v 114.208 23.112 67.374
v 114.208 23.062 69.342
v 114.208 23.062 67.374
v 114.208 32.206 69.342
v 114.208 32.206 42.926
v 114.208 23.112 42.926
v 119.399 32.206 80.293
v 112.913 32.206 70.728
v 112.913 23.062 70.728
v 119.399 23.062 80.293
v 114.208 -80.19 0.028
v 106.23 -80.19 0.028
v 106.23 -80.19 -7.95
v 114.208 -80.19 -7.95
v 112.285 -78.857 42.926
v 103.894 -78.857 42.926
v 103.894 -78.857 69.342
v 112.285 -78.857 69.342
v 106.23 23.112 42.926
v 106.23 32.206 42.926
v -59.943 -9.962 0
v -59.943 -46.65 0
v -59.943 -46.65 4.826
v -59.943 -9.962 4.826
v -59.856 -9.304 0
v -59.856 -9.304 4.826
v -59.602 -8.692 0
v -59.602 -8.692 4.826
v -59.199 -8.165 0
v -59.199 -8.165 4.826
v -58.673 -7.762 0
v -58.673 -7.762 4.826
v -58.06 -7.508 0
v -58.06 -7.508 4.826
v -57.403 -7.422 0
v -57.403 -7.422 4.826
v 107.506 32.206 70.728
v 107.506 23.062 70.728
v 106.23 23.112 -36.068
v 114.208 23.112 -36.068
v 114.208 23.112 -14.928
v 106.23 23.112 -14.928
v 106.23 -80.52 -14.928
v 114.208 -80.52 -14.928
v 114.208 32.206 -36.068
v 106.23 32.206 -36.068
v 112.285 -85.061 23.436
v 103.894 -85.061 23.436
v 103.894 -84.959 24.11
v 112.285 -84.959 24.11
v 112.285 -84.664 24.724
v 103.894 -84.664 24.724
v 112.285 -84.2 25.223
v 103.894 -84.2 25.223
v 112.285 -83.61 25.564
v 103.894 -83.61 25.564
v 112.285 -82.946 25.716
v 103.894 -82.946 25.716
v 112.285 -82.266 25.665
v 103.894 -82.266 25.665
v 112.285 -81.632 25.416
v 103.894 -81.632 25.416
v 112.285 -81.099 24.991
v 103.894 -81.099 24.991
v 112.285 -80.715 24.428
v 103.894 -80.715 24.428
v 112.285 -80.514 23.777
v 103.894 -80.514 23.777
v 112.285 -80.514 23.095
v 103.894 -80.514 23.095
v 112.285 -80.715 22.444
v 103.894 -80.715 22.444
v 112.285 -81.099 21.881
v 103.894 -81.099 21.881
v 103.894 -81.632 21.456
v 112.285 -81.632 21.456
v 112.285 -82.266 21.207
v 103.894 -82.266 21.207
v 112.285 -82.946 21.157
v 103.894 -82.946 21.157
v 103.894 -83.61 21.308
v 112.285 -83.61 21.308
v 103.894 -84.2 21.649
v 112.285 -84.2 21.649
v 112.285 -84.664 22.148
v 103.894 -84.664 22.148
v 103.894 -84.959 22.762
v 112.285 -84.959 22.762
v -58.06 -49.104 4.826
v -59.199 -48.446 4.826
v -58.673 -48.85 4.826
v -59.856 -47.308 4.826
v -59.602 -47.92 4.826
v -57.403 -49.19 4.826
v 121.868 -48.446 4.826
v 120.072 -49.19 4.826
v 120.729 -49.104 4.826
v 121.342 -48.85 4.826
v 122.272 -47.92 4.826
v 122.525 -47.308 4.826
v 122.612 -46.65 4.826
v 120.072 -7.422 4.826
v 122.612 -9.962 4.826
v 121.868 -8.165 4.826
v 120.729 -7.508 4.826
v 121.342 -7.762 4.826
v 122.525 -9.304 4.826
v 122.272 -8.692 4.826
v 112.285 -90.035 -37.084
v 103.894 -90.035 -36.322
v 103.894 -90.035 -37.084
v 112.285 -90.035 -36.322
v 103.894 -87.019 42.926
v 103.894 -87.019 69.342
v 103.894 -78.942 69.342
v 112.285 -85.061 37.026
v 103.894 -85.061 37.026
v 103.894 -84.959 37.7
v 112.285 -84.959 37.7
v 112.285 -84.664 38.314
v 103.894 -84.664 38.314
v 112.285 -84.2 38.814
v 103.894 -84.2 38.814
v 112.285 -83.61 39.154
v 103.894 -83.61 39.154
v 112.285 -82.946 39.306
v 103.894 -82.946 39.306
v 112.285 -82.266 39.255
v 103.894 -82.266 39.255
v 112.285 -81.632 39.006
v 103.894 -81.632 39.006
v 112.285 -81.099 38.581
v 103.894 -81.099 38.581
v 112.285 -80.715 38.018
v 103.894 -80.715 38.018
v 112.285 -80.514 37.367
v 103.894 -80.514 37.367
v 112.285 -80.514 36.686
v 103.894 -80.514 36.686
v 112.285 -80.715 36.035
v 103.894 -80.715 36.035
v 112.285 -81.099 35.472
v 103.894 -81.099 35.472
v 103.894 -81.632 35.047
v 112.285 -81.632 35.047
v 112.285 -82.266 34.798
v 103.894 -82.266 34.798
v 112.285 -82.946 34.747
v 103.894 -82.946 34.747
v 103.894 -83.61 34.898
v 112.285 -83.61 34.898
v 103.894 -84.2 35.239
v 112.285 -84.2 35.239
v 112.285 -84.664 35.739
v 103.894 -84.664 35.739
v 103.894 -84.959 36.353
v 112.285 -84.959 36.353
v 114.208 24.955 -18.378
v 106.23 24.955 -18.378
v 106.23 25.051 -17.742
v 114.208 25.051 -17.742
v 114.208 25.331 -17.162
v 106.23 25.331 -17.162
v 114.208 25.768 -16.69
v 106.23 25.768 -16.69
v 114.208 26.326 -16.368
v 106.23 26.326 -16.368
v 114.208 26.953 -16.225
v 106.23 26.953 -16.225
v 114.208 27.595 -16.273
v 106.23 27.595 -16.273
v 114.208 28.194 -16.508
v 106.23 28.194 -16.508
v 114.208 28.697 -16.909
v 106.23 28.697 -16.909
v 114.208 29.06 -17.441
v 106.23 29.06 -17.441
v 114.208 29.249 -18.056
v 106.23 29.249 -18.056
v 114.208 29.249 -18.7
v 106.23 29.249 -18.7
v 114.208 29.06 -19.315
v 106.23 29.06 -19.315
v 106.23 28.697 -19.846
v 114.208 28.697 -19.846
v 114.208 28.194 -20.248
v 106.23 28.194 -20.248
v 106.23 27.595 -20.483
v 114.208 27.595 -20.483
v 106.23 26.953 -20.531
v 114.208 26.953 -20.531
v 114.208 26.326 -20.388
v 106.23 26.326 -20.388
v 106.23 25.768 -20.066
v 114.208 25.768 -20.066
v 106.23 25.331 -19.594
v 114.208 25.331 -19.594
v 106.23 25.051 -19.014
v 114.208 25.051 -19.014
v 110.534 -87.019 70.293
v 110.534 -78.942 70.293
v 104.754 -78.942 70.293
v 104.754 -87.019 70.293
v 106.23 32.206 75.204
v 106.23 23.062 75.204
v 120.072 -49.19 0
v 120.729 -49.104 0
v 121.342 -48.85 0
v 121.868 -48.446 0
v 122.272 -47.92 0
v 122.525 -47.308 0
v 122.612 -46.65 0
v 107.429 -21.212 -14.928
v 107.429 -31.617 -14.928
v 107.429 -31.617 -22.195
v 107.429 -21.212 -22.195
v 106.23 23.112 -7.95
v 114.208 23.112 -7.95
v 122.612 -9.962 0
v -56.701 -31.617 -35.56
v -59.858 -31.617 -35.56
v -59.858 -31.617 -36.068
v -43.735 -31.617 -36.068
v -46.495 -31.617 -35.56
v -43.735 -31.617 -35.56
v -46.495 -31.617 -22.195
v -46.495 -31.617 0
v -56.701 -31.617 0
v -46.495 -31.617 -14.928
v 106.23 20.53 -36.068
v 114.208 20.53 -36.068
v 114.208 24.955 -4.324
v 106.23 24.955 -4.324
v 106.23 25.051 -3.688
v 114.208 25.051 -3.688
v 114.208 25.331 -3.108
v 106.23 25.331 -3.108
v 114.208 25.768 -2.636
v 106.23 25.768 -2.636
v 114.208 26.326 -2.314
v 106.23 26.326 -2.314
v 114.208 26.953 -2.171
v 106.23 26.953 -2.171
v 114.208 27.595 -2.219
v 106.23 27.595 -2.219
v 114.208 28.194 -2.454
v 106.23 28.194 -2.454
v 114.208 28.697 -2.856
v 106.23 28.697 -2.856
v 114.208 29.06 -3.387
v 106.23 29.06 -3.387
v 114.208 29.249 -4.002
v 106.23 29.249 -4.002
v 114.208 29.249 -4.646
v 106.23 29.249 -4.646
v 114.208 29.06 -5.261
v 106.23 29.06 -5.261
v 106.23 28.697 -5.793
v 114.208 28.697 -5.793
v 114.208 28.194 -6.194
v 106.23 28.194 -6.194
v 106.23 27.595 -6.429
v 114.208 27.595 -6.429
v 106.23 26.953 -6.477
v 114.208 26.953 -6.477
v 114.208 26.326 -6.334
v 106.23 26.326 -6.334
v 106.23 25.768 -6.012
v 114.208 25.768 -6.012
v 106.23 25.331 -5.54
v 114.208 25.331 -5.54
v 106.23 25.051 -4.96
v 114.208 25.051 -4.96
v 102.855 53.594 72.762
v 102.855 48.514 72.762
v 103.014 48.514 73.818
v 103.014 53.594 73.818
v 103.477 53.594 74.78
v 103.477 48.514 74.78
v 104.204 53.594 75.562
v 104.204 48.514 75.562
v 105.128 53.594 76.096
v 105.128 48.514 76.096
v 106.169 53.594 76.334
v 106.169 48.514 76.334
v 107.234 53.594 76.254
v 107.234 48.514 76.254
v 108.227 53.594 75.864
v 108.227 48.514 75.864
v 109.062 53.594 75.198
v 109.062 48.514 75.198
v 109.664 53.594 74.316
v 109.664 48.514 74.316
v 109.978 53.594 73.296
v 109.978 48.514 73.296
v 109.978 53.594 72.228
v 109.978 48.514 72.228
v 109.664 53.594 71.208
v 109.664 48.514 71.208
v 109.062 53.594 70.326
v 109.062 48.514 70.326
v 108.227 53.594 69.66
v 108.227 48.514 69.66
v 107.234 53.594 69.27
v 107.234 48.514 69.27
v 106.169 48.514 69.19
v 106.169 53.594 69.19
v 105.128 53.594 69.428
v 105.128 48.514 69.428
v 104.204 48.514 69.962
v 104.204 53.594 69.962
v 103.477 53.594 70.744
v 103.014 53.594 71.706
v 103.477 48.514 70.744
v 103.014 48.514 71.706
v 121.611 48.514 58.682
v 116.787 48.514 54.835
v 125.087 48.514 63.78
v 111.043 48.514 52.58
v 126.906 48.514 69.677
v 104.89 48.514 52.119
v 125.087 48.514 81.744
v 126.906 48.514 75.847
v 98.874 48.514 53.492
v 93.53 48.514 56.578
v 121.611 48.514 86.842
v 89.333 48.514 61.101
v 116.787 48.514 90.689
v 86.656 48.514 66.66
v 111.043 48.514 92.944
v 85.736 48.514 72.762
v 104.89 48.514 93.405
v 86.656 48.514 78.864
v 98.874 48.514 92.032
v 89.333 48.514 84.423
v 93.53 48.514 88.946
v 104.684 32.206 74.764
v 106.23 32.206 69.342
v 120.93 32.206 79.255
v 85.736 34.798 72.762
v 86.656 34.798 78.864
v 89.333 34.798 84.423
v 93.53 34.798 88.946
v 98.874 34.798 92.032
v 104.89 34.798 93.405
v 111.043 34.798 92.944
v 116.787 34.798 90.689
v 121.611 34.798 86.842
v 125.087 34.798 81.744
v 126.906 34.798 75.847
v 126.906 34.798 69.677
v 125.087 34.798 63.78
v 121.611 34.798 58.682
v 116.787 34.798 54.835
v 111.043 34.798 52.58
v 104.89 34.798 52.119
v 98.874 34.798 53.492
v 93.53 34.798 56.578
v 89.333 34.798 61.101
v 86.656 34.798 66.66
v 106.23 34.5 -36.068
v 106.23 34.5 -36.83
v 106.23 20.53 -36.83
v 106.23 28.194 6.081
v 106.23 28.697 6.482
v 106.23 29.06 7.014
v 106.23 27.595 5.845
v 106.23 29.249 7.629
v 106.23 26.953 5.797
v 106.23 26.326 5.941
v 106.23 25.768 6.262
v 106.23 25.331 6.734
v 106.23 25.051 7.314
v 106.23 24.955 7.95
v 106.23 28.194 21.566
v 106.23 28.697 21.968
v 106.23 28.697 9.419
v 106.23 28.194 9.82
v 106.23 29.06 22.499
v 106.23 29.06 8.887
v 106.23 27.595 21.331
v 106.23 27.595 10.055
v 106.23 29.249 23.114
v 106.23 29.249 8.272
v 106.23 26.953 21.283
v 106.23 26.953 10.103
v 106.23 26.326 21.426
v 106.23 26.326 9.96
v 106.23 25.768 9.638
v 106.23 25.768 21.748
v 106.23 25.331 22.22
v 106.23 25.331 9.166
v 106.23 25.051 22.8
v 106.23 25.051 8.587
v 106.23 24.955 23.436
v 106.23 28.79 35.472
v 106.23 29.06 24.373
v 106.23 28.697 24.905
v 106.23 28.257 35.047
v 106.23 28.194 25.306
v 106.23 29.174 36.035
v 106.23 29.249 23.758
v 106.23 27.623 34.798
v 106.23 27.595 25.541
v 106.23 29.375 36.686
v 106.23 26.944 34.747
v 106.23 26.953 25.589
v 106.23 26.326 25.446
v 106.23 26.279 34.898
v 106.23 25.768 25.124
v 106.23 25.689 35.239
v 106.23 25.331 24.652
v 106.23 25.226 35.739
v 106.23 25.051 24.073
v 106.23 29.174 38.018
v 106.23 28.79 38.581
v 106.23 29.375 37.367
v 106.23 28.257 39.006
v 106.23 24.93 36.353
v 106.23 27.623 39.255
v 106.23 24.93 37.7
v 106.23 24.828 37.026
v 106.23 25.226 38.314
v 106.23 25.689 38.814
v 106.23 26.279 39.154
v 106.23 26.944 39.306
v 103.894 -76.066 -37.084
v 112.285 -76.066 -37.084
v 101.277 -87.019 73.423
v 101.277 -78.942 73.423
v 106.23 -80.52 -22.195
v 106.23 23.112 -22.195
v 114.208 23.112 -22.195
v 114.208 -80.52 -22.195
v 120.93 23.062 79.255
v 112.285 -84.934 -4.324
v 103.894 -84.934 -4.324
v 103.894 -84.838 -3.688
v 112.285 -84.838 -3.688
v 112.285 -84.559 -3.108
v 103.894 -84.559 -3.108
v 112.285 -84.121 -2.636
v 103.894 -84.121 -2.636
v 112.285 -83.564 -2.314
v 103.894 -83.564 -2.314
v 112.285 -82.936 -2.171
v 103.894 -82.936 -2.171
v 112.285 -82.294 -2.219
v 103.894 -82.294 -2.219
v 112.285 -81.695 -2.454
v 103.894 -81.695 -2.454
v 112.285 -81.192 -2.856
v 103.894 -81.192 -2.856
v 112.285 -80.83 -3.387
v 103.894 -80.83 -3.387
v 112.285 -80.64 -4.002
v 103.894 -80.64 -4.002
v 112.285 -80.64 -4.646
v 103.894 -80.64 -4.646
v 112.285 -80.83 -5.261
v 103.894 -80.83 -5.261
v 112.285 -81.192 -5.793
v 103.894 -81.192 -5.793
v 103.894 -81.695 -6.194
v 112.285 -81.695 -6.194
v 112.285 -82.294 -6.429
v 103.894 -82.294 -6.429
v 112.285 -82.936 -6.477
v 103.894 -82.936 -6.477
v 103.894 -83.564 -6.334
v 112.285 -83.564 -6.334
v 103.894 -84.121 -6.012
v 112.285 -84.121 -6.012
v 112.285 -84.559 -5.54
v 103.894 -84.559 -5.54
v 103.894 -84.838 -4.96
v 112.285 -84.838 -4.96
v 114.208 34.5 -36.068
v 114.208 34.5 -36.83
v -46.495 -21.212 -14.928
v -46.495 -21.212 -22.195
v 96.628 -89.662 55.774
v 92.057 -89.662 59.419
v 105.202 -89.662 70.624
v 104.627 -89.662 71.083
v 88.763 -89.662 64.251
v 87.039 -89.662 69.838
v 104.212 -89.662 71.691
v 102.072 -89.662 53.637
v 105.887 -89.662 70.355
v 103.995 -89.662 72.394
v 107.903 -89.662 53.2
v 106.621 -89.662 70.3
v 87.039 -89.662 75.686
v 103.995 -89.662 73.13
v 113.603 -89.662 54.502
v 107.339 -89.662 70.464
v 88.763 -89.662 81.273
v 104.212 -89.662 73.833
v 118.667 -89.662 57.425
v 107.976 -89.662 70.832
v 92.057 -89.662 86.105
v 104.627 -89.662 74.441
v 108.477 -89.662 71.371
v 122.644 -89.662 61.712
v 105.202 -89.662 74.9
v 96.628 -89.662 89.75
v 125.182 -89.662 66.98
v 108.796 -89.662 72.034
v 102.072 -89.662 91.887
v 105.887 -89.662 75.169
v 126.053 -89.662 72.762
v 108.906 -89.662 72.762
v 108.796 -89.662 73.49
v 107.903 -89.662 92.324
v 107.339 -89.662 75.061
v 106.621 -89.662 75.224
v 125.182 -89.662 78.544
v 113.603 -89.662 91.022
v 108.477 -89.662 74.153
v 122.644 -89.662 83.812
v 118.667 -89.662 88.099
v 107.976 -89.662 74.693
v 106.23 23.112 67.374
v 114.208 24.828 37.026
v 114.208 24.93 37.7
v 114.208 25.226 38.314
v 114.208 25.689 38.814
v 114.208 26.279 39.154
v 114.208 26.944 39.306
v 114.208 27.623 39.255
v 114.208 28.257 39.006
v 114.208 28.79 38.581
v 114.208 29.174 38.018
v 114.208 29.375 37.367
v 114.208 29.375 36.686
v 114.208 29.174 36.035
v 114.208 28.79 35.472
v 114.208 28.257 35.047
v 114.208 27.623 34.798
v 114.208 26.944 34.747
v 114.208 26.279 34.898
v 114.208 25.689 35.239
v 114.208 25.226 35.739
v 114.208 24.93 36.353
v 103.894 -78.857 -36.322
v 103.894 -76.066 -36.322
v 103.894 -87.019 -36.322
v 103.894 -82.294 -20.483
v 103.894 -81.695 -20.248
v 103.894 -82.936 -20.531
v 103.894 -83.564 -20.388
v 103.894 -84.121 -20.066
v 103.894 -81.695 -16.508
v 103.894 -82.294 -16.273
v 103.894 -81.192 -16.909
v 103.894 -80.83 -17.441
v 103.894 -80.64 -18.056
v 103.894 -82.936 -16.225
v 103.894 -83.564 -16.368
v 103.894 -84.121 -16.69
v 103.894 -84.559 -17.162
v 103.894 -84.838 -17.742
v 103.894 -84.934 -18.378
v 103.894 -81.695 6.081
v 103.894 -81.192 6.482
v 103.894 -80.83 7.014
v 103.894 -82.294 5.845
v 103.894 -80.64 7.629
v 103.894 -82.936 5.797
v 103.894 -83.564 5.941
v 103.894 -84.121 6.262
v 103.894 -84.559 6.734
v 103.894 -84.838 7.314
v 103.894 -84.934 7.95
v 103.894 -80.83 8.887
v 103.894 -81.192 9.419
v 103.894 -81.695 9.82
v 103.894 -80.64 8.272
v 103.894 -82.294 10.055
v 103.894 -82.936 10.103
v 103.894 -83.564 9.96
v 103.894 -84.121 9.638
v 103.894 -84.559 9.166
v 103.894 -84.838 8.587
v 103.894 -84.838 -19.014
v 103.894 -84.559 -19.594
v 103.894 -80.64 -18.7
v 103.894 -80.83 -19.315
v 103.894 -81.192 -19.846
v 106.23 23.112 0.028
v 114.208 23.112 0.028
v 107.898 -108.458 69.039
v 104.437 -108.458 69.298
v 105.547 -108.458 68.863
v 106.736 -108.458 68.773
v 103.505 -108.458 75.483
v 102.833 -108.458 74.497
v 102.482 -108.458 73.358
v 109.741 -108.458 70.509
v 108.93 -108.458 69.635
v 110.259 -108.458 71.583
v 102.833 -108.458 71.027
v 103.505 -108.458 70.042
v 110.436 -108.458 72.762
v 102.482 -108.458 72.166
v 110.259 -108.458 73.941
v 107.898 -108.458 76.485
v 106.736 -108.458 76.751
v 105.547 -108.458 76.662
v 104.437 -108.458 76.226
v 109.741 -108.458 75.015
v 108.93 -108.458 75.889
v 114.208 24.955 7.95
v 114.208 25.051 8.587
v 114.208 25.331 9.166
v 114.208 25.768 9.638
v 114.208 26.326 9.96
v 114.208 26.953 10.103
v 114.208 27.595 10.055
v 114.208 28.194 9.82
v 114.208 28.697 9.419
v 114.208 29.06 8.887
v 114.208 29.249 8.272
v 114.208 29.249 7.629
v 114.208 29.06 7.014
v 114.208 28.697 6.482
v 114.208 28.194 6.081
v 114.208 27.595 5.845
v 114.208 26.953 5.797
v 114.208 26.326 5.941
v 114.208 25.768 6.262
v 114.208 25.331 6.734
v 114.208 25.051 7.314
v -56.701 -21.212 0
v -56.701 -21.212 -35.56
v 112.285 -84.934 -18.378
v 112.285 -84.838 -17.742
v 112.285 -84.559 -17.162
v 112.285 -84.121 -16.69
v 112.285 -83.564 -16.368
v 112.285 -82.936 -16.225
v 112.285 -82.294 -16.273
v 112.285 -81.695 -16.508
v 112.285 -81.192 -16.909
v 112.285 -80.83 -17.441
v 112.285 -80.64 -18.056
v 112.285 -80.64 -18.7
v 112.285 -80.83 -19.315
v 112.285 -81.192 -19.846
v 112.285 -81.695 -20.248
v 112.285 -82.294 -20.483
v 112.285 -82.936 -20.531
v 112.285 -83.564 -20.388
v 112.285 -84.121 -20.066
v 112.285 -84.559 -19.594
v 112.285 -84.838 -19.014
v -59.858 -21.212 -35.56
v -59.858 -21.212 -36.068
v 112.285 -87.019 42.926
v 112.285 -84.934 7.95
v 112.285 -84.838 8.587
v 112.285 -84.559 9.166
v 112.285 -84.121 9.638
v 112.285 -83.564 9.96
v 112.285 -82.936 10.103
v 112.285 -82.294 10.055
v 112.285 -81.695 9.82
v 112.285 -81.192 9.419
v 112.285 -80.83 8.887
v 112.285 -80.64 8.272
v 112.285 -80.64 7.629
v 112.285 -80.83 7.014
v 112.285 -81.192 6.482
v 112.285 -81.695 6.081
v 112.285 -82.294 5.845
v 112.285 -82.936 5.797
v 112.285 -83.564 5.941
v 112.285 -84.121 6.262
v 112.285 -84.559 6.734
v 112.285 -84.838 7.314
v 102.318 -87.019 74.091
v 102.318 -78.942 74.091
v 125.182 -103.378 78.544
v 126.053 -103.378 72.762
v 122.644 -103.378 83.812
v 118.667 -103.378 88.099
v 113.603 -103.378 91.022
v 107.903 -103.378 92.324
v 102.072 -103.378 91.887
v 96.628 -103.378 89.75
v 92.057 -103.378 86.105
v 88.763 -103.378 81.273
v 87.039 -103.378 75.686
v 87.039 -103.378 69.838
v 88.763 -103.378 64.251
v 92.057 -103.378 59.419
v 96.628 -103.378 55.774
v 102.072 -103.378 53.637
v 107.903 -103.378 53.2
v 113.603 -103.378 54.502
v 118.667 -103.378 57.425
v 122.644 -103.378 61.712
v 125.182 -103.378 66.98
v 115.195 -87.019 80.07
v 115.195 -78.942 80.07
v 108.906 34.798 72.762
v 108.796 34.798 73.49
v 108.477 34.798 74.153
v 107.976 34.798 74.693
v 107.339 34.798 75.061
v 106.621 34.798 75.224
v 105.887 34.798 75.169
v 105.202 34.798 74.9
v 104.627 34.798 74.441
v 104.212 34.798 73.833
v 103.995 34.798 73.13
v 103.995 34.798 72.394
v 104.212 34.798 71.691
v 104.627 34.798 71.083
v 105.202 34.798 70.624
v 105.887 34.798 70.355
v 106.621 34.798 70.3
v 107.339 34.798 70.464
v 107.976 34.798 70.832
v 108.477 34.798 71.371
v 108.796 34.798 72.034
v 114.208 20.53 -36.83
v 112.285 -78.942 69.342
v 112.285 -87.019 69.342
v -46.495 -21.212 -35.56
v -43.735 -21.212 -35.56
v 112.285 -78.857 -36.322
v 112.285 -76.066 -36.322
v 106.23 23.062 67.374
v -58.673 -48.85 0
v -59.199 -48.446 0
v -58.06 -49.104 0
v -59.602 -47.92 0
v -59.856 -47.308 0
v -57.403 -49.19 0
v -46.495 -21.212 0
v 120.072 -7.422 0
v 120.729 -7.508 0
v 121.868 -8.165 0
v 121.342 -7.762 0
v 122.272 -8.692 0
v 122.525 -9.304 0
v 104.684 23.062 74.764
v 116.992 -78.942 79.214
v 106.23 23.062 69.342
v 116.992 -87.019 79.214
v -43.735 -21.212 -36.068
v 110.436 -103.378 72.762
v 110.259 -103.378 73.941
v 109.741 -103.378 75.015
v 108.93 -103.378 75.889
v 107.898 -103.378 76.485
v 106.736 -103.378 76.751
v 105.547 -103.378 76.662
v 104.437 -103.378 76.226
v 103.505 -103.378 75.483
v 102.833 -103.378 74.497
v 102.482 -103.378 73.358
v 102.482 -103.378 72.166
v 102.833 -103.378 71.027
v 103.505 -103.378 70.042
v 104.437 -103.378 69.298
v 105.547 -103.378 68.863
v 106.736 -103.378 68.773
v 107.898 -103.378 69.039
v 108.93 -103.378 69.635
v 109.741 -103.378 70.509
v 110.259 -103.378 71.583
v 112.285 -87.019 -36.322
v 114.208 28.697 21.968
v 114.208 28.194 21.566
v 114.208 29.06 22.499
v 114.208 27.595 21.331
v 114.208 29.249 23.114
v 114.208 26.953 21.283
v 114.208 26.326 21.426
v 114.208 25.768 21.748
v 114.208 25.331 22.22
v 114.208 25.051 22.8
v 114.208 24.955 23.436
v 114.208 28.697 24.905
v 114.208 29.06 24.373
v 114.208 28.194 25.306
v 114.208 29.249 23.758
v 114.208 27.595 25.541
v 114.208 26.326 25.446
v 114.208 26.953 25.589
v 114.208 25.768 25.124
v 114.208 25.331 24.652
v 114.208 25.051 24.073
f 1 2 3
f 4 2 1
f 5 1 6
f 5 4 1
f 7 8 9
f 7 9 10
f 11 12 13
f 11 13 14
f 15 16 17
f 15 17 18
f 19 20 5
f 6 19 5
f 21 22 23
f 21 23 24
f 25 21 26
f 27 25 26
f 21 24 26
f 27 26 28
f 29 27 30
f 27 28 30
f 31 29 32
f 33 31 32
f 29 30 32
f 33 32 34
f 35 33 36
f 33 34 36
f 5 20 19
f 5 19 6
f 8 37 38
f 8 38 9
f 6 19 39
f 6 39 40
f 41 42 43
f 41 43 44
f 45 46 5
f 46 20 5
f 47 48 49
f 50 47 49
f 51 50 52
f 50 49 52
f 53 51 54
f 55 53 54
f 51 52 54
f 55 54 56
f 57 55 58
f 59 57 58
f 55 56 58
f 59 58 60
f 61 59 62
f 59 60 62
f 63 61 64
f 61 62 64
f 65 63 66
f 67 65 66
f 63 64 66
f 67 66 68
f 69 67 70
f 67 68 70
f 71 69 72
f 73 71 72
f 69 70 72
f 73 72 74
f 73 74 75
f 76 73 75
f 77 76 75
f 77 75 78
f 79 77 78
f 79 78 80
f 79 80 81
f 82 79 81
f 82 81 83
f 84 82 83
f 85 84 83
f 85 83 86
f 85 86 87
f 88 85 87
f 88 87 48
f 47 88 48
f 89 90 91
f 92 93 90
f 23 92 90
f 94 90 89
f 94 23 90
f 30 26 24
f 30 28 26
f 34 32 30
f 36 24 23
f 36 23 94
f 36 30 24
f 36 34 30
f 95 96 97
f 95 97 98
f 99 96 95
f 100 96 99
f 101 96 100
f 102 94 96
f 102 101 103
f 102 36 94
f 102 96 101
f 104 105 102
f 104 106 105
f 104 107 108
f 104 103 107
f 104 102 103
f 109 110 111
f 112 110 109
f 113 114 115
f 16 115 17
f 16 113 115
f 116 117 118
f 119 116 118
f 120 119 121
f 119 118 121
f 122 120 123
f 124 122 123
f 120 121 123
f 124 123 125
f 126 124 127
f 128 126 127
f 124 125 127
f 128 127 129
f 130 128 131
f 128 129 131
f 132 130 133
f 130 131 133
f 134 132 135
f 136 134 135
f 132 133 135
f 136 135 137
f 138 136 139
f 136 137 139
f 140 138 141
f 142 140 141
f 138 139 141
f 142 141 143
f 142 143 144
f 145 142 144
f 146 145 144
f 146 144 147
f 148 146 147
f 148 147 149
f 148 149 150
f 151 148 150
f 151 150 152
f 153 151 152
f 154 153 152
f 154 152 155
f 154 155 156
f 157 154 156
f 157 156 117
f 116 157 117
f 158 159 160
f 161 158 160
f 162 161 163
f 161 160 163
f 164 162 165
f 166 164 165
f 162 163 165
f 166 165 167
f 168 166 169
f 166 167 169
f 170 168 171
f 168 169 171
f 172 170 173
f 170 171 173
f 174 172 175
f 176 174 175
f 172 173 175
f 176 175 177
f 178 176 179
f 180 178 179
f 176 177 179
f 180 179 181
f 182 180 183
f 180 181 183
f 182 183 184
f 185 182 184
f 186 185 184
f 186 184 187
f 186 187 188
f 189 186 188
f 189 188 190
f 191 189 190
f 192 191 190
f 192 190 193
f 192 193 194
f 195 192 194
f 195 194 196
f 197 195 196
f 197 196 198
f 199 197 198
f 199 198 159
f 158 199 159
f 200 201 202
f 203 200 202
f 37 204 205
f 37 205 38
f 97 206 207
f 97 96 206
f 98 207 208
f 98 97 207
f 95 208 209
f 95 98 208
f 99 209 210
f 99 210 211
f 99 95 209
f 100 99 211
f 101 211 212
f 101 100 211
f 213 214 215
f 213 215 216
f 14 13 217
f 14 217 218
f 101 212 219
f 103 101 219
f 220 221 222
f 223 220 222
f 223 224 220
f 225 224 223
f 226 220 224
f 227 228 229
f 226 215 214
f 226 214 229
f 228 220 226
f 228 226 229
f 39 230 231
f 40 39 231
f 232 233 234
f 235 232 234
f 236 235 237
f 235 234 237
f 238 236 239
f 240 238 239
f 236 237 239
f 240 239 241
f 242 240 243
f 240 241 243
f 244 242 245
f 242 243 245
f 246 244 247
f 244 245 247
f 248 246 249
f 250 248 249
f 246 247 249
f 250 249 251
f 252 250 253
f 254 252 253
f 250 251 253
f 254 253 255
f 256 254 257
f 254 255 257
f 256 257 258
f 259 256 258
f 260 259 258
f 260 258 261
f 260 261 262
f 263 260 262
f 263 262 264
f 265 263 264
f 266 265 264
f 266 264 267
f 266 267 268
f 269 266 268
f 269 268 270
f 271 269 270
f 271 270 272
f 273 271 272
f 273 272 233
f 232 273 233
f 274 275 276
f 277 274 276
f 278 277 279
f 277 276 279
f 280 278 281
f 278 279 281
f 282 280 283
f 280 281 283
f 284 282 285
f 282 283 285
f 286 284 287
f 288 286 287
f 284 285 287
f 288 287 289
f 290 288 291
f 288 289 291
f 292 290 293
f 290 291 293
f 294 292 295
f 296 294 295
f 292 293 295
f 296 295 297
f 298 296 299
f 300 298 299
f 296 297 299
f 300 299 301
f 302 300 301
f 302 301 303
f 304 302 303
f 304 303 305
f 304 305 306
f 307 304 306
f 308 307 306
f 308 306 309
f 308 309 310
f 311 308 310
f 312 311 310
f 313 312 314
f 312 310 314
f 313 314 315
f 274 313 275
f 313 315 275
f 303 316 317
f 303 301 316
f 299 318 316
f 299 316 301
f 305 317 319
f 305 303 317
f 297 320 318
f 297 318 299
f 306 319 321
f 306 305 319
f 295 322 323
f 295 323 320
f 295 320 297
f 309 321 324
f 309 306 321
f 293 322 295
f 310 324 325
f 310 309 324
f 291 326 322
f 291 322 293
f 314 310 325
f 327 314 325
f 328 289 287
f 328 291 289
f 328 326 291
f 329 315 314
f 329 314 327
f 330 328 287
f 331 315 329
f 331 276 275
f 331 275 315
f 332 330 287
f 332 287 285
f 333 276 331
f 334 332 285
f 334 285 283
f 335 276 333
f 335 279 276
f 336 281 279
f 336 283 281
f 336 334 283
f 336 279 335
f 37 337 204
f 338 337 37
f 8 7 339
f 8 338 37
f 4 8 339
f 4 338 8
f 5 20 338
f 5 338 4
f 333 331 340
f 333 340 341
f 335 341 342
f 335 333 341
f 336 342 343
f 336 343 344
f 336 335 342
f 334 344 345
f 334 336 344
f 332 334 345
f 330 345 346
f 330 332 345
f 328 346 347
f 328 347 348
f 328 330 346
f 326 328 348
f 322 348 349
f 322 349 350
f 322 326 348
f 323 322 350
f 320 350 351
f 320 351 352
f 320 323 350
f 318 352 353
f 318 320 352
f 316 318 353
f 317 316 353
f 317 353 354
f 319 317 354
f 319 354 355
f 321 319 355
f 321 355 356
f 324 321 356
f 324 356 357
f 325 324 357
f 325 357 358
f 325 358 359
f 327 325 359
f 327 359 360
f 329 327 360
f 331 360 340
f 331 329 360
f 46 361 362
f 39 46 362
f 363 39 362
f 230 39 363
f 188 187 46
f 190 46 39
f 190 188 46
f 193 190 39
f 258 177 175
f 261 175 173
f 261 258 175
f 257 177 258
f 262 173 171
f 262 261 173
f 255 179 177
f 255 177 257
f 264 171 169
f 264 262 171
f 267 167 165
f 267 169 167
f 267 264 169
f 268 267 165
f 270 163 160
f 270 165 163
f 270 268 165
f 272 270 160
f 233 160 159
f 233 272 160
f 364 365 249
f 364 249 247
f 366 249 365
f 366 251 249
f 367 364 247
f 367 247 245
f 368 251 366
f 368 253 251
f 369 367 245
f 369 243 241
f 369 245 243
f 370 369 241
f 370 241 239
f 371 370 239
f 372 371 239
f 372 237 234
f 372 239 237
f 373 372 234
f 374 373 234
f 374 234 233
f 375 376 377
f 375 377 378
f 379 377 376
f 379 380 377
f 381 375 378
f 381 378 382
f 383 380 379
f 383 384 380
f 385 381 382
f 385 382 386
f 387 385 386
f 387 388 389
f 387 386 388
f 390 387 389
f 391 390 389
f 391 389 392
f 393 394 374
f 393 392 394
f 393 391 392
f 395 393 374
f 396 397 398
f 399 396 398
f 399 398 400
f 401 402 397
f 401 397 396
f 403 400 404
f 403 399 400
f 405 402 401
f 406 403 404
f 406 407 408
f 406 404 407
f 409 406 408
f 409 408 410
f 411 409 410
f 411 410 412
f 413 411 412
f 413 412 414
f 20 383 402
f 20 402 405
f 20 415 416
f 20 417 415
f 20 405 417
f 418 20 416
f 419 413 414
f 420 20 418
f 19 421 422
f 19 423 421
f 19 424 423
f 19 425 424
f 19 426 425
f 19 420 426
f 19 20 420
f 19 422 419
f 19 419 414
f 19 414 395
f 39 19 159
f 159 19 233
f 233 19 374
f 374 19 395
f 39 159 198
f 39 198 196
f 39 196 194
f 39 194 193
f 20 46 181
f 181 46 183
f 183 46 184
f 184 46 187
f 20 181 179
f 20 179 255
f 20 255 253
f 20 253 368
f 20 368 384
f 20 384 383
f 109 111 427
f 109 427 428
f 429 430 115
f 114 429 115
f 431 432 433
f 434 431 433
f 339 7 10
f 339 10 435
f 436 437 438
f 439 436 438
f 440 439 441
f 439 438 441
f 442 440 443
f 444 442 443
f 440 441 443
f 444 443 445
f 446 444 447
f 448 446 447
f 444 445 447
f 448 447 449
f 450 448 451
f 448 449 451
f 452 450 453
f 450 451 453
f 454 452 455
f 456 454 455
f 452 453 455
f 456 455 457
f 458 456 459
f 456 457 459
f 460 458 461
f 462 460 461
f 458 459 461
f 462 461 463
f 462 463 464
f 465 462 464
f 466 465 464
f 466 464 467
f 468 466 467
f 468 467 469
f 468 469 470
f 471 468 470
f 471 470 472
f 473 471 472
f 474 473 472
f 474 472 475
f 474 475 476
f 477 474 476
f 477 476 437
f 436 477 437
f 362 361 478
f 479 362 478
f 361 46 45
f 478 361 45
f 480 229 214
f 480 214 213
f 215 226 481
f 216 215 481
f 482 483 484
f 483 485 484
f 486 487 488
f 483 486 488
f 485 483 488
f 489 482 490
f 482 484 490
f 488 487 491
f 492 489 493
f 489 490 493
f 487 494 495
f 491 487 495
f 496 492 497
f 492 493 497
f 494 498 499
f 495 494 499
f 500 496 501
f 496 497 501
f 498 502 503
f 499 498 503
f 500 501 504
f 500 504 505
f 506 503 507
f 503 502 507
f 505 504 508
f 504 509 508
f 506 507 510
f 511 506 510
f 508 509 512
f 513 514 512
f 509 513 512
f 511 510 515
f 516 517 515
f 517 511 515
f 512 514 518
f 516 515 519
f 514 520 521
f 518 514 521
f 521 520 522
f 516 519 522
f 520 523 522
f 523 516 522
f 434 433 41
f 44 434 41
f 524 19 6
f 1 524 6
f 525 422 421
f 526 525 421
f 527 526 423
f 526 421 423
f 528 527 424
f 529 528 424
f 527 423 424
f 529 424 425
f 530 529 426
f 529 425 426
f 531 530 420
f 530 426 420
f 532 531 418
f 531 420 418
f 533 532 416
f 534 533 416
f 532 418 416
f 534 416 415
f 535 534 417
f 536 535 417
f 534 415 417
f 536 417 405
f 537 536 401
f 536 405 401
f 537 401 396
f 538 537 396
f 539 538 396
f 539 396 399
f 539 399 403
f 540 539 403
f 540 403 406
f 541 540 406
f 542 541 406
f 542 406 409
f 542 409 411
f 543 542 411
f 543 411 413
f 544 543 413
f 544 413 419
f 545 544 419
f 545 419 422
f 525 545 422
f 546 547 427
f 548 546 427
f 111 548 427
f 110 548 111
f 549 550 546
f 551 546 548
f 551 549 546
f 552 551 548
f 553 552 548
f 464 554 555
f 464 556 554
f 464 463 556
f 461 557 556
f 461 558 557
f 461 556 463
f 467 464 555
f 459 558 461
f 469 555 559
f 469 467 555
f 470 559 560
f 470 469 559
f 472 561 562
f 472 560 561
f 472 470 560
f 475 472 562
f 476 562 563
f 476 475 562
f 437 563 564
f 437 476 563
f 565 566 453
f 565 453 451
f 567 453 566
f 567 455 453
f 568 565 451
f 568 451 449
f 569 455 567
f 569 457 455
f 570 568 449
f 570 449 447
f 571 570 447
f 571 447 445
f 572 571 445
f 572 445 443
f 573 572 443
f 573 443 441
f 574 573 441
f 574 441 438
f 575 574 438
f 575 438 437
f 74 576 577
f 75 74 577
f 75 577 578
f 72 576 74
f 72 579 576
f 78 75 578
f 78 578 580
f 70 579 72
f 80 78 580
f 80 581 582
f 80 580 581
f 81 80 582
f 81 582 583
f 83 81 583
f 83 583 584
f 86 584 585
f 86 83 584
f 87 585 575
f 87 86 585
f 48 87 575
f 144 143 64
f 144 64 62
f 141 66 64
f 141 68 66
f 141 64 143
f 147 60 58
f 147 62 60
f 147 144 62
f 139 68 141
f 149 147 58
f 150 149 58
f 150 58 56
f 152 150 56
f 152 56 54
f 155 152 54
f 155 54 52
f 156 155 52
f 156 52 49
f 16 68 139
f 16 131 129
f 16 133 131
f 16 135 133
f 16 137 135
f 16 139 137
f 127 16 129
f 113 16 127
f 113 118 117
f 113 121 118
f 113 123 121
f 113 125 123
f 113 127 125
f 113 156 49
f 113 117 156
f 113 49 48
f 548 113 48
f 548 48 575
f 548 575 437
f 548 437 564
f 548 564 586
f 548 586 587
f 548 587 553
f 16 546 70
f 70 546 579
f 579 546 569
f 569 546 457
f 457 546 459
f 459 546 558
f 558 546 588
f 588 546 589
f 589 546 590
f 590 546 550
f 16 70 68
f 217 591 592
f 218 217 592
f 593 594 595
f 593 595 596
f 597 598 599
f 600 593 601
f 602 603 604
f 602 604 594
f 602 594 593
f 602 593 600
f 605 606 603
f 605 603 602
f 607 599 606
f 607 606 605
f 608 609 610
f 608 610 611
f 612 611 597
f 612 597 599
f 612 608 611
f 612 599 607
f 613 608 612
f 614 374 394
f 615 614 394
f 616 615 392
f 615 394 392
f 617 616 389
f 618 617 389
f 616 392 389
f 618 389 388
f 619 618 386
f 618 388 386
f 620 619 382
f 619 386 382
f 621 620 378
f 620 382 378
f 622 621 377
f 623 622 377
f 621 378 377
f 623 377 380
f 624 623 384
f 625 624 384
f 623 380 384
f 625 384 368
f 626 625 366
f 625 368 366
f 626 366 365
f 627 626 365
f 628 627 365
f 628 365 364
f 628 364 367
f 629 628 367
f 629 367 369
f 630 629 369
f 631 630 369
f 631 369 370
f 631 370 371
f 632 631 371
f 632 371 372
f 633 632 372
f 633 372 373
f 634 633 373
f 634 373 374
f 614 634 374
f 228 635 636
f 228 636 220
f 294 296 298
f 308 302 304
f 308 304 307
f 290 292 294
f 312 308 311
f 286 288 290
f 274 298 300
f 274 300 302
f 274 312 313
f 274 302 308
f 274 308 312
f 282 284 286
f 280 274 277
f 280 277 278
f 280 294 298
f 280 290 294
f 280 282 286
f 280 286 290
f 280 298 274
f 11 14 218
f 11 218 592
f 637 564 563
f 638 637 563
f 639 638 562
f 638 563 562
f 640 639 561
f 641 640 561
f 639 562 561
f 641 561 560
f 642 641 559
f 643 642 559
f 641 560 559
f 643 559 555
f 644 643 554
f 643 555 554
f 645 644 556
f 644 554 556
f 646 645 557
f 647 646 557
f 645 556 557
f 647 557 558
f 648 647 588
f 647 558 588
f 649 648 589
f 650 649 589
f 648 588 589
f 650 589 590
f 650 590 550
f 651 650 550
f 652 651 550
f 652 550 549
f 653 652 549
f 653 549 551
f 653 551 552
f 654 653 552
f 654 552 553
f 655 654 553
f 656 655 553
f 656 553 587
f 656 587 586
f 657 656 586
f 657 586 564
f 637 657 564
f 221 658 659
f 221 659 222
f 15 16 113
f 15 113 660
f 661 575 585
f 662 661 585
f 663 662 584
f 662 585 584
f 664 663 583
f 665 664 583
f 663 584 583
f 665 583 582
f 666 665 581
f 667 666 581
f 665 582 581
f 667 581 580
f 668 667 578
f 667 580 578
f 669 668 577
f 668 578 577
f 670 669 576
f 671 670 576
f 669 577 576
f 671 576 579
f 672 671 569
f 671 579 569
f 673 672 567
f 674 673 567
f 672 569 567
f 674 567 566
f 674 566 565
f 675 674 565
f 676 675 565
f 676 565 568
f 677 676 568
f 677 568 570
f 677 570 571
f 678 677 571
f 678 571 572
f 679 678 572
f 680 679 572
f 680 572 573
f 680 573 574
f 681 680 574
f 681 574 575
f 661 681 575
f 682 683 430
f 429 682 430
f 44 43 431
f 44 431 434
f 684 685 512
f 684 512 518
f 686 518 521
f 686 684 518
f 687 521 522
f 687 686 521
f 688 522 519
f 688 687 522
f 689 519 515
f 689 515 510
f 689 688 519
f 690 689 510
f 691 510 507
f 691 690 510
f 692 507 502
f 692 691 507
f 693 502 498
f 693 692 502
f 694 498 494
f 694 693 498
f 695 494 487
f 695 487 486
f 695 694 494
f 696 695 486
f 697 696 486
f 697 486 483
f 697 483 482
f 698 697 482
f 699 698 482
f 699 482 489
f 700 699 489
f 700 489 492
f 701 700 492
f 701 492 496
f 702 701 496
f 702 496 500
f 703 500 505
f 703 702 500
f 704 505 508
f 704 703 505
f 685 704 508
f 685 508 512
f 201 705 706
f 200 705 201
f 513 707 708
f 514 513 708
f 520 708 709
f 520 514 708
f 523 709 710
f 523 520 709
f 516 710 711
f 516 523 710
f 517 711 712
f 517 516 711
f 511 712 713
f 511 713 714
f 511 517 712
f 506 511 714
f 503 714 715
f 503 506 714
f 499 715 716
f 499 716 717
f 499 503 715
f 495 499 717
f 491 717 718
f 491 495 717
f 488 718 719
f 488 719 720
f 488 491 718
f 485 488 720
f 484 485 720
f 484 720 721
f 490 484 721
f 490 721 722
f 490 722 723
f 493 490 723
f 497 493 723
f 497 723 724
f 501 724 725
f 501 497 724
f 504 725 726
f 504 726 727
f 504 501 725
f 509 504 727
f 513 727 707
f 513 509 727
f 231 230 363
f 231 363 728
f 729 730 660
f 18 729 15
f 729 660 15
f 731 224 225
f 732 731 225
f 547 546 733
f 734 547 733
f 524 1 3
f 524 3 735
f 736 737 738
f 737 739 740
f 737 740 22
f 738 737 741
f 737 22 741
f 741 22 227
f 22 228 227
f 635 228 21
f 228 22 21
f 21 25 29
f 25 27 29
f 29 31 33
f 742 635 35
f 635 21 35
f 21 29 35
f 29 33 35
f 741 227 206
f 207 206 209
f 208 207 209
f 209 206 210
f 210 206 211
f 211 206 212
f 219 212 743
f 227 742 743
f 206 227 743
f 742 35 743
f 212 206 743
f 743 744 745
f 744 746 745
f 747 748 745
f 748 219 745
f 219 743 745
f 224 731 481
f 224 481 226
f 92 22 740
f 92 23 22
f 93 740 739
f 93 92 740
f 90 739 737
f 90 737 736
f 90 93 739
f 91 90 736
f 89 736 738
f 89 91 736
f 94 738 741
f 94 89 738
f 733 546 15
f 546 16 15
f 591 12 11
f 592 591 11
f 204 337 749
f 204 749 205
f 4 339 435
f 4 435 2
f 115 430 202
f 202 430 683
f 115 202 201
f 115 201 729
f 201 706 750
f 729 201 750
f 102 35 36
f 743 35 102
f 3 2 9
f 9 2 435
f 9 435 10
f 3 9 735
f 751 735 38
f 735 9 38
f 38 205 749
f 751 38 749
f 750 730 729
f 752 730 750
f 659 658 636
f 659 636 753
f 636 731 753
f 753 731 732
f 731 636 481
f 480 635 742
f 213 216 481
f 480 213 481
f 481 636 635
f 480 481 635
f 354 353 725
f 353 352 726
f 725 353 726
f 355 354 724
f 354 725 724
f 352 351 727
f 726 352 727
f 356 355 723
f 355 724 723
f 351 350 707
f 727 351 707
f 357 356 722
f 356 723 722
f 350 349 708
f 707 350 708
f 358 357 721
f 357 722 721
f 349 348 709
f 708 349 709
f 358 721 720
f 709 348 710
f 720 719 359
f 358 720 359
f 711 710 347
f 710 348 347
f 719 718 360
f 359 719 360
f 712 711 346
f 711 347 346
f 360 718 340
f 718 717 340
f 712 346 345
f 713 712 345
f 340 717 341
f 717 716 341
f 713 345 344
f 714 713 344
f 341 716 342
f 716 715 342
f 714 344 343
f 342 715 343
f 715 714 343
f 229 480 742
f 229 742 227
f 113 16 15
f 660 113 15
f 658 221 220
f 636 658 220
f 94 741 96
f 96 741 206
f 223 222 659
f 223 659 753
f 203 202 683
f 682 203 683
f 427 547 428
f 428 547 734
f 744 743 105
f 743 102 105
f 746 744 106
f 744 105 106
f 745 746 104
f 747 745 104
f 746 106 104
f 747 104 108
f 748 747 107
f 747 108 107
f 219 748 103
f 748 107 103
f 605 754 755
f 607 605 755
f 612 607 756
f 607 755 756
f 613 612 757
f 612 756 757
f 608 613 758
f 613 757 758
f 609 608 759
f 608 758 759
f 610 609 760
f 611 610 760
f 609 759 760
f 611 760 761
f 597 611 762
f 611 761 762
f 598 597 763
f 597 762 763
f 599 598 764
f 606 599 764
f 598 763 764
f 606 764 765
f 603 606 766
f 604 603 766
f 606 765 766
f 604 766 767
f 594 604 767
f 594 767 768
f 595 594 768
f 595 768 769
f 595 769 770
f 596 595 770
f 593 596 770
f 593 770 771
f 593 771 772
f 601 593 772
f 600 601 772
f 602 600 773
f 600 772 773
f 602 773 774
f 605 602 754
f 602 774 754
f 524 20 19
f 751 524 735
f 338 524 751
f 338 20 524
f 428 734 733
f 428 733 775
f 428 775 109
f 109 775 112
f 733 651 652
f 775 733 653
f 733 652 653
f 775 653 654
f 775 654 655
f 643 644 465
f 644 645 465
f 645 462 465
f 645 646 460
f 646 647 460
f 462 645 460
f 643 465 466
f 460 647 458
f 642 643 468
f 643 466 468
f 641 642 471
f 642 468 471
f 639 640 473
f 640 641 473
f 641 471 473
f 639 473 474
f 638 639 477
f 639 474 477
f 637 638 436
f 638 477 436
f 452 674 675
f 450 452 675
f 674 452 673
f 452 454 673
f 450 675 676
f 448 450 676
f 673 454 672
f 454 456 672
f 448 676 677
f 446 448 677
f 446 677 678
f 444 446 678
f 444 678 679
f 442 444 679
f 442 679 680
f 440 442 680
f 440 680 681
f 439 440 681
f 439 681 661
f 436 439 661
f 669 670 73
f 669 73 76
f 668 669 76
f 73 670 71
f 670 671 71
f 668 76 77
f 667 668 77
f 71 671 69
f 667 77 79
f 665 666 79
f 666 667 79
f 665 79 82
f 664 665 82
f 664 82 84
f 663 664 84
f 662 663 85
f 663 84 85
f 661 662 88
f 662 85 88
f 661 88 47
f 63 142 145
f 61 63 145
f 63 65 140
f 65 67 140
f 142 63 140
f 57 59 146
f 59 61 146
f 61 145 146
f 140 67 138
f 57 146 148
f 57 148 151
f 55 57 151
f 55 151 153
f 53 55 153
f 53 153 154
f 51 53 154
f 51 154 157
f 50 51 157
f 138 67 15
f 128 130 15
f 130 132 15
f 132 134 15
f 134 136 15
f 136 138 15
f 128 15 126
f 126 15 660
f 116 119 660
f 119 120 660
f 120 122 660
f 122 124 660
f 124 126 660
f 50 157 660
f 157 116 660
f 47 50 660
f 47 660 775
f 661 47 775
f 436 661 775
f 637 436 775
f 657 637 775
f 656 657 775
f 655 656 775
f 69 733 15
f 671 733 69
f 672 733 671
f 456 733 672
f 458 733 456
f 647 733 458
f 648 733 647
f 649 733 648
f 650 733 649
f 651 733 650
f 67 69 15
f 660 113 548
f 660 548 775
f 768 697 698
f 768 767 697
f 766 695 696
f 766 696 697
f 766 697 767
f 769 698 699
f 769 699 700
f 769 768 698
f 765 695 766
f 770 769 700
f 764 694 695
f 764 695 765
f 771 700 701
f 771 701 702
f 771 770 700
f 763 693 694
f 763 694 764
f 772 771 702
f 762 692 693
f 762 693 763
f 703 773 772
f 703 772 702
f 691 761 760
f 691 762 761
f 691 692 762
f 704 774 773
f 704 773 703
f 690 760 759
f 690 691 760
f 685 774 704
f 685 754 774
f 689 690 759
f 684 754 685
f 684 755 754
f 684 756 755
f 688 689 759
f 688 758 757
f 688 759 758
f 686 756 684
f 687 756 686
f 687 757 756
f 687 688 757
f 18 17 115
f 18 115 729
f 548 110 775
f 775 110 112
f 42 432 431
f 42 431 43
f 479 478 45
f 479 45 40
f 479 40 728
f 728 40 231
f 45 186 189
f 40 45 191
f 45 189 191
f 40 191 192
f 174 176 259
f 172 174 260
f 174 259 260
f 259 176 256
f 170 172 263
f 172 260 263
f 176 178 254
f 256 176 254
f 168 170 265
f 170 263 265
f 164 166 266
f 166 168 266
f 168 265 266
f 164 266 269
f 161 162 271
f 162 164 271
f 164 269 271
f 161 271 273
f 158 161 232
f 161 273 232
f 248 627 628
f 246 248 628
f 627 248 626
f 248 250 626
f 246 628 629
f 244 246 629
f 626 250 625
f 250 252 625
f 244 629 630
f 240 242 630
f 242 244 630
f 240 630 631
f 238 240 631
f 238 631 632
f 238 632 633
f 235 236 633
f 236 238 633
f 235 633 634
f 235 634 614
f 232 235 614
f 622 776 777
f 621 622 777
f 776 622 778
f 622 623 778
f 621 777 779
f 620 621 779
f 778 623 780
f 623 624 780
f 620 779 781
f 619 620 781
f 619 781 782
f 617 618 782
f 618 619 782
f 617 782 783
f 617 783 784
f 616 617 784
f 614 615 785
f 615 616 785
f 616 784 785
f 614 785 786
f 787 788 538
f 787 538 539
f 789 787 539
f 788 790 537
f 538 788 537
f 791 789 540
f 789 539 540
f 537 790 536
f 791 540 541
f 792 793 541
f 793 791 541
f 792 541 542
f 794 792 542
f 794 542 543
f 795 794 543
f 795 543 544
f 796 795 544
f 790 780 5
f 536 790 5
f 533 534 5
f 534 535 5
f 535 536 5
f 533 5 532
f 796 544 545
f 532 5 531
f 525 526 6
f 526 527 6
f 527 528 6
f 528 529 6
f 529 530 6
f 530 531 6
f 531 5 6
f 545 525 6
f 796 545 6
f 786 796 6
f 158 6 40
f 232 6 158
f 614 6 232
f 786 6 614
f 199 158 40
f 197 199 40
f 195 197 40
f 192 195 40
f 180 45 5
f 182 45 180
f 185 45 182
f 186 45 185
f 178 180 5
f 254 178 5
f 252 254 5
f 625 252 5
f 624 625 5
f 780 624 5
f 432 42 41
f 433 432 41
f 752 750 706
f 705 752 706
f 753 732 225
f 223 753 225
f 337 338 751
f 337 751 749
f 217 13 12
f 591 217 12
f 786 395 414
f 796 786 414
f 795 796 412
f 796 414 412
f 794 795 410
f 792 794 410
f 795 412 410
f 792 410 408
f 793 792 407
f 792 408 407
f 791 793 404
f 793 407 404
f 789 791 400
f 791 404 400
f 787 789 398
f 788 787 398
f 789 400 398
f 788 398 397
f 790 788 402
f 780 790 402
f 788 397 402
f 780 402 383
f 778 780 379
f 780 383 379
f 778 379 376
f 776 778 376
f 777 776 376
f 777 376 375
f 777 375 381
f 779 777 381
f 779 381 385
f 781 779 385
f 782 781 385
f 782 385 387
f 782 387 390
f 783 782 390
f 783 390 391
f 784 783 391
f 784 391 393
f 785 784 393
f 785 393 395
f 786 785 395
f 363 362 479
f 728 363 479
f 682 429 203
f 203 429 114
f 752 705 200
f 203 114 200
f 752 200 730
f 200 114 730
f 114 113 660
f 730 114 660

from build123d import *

# Parameters (mm, degrees)
F0_W           = 182.5544759631
F0_H           = 41.7688651942
F1_DEPTH       = 4.826
F2_W           = 10.2060101926
F2_H           = 10.4048848152
F3_DEPTH       = 35.56
F4_W           = 16.1235965788
F4_H           = 10.4048848152
F5_DEPTH       = 0.508
F6_W           = 10.4048848152
F6_H           = 7.266888395
F7_DEPTH       = 153.924
F8_W           = 8.3915367723
F8_H           = 8.1624239683
F9_DEPTH       = 42.926
F9_DEPTH_BACK  = 36.322
F10_W          = 7.9777687788
F10_H          = 9.0949684381
F11_DEPTH      = 42.926
F11_DEPTH_BACK = 36.068
F12_W          = 7.9777687788
F12_H          = 7.266888395
F13_DEPTH      = 103.632
F14_W          = 8.3915367723
F14_H          = 8.1624239683
F15_DEPTH      = 26.416
F16_W          = 7.9777687788
F16_H          = 9.0949684381
F17_DEPTH      = 26.416
F18_W          = 7.9777687788
F18_H          = 7.9777687788
F19_DEPTH      = 103.3018
F21_DEPTH      = 8.0772
F23_DEPTH      = 9.144
F24_R          = 2.54
F25_R          = 2.4691637826
F26_DEPTH      = 103.378
F26_DEPTH_BACK = 48.514
F27_R          = 19.6164042051
F28_DEPTH      = 13.716
F29_R          = 20.7006908264
F30_DEPTH      = 13.716
F31_R          = 3.5815774467
F32_DEPTH      = 5.08
F33_R          = 3.9997666951
F34_DEPTH      = 5.08
F35_R          = 2.286
F36_DEPTH      = 25.4
F37_R          = 2.286
F38_DEPTH      = 25.4
F39_R          = 2.159
F40_DEPTH      = 25.4
F41_R          = 2.159
F42_DEPTH      = 25.4
F43_R          = 2.159
F44_DEPTH      = 25.4
F45_R          = 2.286
F46_DEPTH      = 25.4
F47_R          = 2.159
F48_DEPTH      = 25.4
F49_R          = 2.159
F50_DEPTH      = 25.4
F51_R          = 2.159
F52_DEPTH      = 25.4
F53_R          = 2.159
F54_DEPTH      = 25.4
F55_W          = 8.3915367723
F55_H          = 13.9687731862
F56_DEPTH      = 0.762
F57_W          = 7.9777687788
F57_H          = 13.97
F58_DEPTH      = 0.762


with BuildPart() as f1:
    # F0 (on Top) → F1 (new body)
    with BuildSketch(Plane.XY):
        with Locations((31.3345678151, -28.3059768844)):
            Rectangle(F0_W, F0_H)
    extrude(amount=F1_DEPTH)

    # F2 (on face) → F3 (join)
    with BuildSketch(Plane(origin=(0, 0, 0), x_dir=(1, 0, 0), z_dir=(0, 0, -1))):
        with Locations((-51.5984315425, 26.4149345458)):
            Rectangle(F2_W, F2_H)
    extrude(amount=F3_DEPTH)

    # F4 (on face) → F5 (join)
    with BuildSketch(Plane(origin=(0, 0, -35.56), x_dir=(1, 0, 0), z_dir=(0, 0, -1))):
        with Locations((-51.7963599414, 26.4149345458)):
            Rectangle(F4_W, F4_H)
    extrude(amount=F5_DEPTH)

    # F6 (on face) → F7 (join)
    with BuildSketch(Plane.YZ.offset(-46.4954264462)):
        with Locations((-26.4149345458, -18.561120145)):
            Rectangle(F6_W, F6_H)
    extrude(amount=F7_DEPTH)

    # F24
    f24_edges = [f1.edges().sort_by_distance(p)[0] for p in [
        (-59.94267, -49.190409, 2.413),
        (-59.94267, -7.421544, 2.413),
        (122.611806, -7.421544, 2.413),
        (122.611806, -49.190409, 2.413),
    ]]
    fillet(f24_edges, radius=F24_R)


with BuildPart() as f9:
    # F8 (on Top) → F9 (new body, two sides)
    with BuildSketch(Plane.XY) as f9_sk:
        with Locations((108.089659363, -82.9381048679)):
            Rectangle(F8_W, F8_H)
    extrude(amount=F9_DEPTH)
    extrude(f9_sk.sketch, amount=-F9_DEPTH_BACK)

    # F35 (on face) → F36 (cut)
    with BuildSketch(Plane(origin=(103.8938909769, 0, 0), x_dir=(0, -1, 0), z_dir=(-1, 0, 0))):
        with Locations((82.7748328447, 37.0264612138)):
            Circle(F35_R)
    extrude(amount=-F36_DEPTH, mode=Mode.SUBTRACT)

    # F37 (on face) → F38 (cut)
    with BuildSketch(Plane(origin=(103.8938909769, 0, 0), x_dir=(0, -1, 0), z_dir=(-1, 0, 0))):
        with Locations((82.7748328447, 23.4361514449)):
            Circle(F37_R)
    extrude(amount=-F38_DEPTH, mode=Mode.SUBTRACT)

    # F39 (on face) → F40 (cut)
    with BuildSketch(Plane(origin=(103.8938909769, 0, 0), x_dir=(0, -1, 0), z_dir=(-1, 0, 0))):
        with Locations((82.7748328447, 7.9502836706)):
            Circle(F39_R)
    extrude(amount=-F40_DEPTH, mode=Mode.SUBTRACT)

    # F41 (on face) → F42 (cut)
    with BuildSketch(Plane(origin=(103.8938909769, 0, 0), x_dir=(0, -1, 0), z_dir=(-1, 0, 0))):
        with Locations((82.7748328447, -4.324061789)):
            Circle(F41_R)
    extrude(amount=-F42_DEPTH, mode=Mode.SUBTRACT)

    # F43 (on face) → F44 (cut)
    with BuildSketch(Plane(origin=(103.8938909769, 0, 0), x_dir=(0, -1, 0), z_dir=(-1, 0, 0))):
        with Locations((82.7748328447, -18.3779209473)):
            Circle(F43_R)
    extrude(amount=-F44_DEPTH, mode=Mode.SUBTRACT)

    # F55 (on face) → F56 (join)
    with BuildSketch(Plane(origin=(0, 0, -36.322), x_dir=(1, 0, 0), z_dir=(0, 0, -1))):
        with Locations((108.089659363, 83.0502994359)):
            Rectangle(F55_W, F55_H)
    extrude(amount=F56_DEPTH)


with BuildPart() as f11:
    # F10 (on Top) → F11 (new body, two sides)
    with BuildSketch(Plane.XY) as f11_sk:
        with Locations((110.2189868689, 27.6590138674)):
            Rectangle(F10_W, F10_H)
    extrude(amount=F11_DEPTH)
    extrude(f11_sk.sketch, amount=-F11_DEPTH_BACK)

    # F45 (on face) → F46 (cut)
    with BuildSketch(Plane(origin=(106.2301024795, 0, 0), x_dir=(0, -1, 0), z_dir=(-1, 0, 0))):
        with Locations((-27.1144246185, 37.0264612138)):
            Circle(F45_R)
    extrude(amount=-F46_DEPTH, mode=Mode.SUBTRACT)

    # F47 (on face) → F48 (cut)
    with BuildSketch(Plane(origin=(106.2301024795, 0, 0), x_dir=(0, -1, 0), z_dir=(-1, 0, 0))):
        with Locations((-27.1144246185, 23.4361514449)):
            Circle(F47_R)
    extrude(amount=-F48_DEPTH, mode=Mode.SUBTRACT)

    # F49 (on face) → F50 (cut)
    with BuildSketch(Plane(origin=(106.2301024795, 0, 0), x_dir=(0, -1, 0), z_dir=(-1, 0, 0))):
        with Locations((-27.1144246185, 7.9502836706)):
            Circle(F49_R)
    extrude(amount=-F50_DEPTH, mode=Mode.SUBTRACT)

    # F51 (on face) → F52 (cut)
    with BuildSketch(Plane(origin=(106.2301024795, 0, 0), x_dir=(0, -1, 0), z_dir=(-1, 0, 0))):
        with Locations((-27.1144246185, -4.324061789)):
            Circle(F51_R)
    extrude(amount=-F52_DEPTH, mode=Mode.SUBTRACT)

    # F53 (on face) → F54 (cut)
    with BuildSketch(Plane(origin=(106.2301024795, 0, 0), x_dir=(0, -1, 0), z_dir=(-1, 0, 0))):
        with Locations((-27.1144246185, -18.3779209473)):
            Circle(F53_R)
    extrude(amount=-F54_DEPTH, mode=Mode.SUBTRACT)

    # F57 (on face) → F58 (join)
    with BuildSketch(Plane(origin=(0, 0, -36.068), x_dir=(1, 0, 0), z_dir=(0, 0, -1))):
        with Locations((110.2189868689, -27.5148501241)):
            Rectangle(F57_W, F57_H)
    extrude(amount=F58_DEPTH)


with BuildPart() as f13:
    # F12 (on face) → F13 (new body)
    with BuildSketch(Plane.XZ.offset(-23.1115296483)):
        with Locations((110.2189868689, -18.561120145)):
            Rectangle(F12_W, F12_H)
    extrude(amount=F13_DEPTH)


with BuildPart() as f15:
    # F14 (on face) → F15 (new body)
    with BuildSketch(Plane.XY.offset(42.926)):
        with Locations((108.089659363, -82.9381048679)):
            Rectangle(F14_W, F14_H)
    extrude(amount=F15_DEPTH)

    # F20 (on face) → F21 (join)
    with BuildSketch(Plane.XZ.offset(87.0193168521)):
        Polygon((103.8938909769, 69.342), (103.8938909769, 67.6358491182), (112.2854277492, 67.6358491182), (112.2854277492, 69.342), (116.9915574782, 79.2138812944), (115.1953257449, 80.0701820651), (110.5342805386, 70.2928729737), (104.753809084, 70.2928729737), (102.3182260611, 74.0911631414), (101.2767925858, 73.4233632684), align=None)
    extrude(amount=-F21_DEPTH)


with BuildPart() as f17:
    # F16 (on face) → F17 (new body)
    with BuildSketch(Plane.XY.offset(42.926)):
        with Locations((110.2189868689, 27.6590138674)):
            Rectangle(F16_W, F16_H)
    extrude(amount=F17_DEPTH)

    # F22 (on face) → F23 (join)
    with BuildSketch(Plane(origin=(0, 32.2064980865, 0), x_dir=(-1, 0, 0), z_dir=(0, 1, 0))):
        Polygon((-114.2078712583, 69.342), (-114.2078712583, 67.373663187), (-106.2301024795, 67.373663187), (-106.2301024795, 69.342), (-104.6840838743, 74.763624908), (-106.2301024795, 75.2044841647), (-107.5064986944, 70.7283792274), (-112.9132110877, 70.7283792274), (-119.3986680894, 80.2934111335), (-120.9295466542, 79.2554169893), align=None)
    extrude(amount=-F23_DEPTH)


with BuildPart() as f19:
    # F18 (on face) → F19 (new body)
    with BuildSketch(Plane.XZ.offset(-23.1115296483)):
        with Locations((110.2189868689, -3.9612364417)):
            Rectangle(F18_W, F18_H)
    extrude(amount=F19_DEPTH)


with BuildPart() as f26:
    # F25 (on Front) → F26 (new body, two sides)
    with BuildSketch(Plane.XZ) as f26_sk:
        with Locations((106.436625123, 72.7620367564)):
            Circle(F25_R)
    extrude(amount=F26_DEPTH)
    extrude(f26_sk.sketch, amount=-F26_DEPTH_BACK)

    # F27 (on face) → F28 (join)
    with BuildSketch(Plane.XZ.offset(103.378)):
        with Locations((106.436625123, 72.7620367564)):
            Circle(F27_R)
    extrude(amount=-F28_DEPTH)

    # F29 (on face) → F30 (join)
    with BuildSketch(Plane(origin=(0, 48.514, 0), x_dir=(-1, 0, 0), z_dir=(0, 1, 0))):
        with Locations((-106.436625123, 72.7620367564)):
            Circle(F29_R)
    extrude(amount=-F30_DEPTH)

    # F31 (on face) → F32 (join)
    with BuildSketch(Plane(origin=(0, 48.514, 0), x_dir=(-1, 0, 0), z_dir=(0, 1, 0))):
        with Locations((-106.436625123, 72.7620367564)):
            Circle(F31_R)
    extrude(amount=F32_DEPTH)

    # F33 (on face) → F34 (join)
    with BuildSketch(Plane.XZ.offset(103.378)):
        with Locations((106.436625123, 72.7620367564)):
            Circle(F33_R)
    extrude(amount=F34_DEPTH)


solid = Compound([f1.part, f9.part, f11.part, f13.part, f15.part, f17.part, f19.part, f26.part])
